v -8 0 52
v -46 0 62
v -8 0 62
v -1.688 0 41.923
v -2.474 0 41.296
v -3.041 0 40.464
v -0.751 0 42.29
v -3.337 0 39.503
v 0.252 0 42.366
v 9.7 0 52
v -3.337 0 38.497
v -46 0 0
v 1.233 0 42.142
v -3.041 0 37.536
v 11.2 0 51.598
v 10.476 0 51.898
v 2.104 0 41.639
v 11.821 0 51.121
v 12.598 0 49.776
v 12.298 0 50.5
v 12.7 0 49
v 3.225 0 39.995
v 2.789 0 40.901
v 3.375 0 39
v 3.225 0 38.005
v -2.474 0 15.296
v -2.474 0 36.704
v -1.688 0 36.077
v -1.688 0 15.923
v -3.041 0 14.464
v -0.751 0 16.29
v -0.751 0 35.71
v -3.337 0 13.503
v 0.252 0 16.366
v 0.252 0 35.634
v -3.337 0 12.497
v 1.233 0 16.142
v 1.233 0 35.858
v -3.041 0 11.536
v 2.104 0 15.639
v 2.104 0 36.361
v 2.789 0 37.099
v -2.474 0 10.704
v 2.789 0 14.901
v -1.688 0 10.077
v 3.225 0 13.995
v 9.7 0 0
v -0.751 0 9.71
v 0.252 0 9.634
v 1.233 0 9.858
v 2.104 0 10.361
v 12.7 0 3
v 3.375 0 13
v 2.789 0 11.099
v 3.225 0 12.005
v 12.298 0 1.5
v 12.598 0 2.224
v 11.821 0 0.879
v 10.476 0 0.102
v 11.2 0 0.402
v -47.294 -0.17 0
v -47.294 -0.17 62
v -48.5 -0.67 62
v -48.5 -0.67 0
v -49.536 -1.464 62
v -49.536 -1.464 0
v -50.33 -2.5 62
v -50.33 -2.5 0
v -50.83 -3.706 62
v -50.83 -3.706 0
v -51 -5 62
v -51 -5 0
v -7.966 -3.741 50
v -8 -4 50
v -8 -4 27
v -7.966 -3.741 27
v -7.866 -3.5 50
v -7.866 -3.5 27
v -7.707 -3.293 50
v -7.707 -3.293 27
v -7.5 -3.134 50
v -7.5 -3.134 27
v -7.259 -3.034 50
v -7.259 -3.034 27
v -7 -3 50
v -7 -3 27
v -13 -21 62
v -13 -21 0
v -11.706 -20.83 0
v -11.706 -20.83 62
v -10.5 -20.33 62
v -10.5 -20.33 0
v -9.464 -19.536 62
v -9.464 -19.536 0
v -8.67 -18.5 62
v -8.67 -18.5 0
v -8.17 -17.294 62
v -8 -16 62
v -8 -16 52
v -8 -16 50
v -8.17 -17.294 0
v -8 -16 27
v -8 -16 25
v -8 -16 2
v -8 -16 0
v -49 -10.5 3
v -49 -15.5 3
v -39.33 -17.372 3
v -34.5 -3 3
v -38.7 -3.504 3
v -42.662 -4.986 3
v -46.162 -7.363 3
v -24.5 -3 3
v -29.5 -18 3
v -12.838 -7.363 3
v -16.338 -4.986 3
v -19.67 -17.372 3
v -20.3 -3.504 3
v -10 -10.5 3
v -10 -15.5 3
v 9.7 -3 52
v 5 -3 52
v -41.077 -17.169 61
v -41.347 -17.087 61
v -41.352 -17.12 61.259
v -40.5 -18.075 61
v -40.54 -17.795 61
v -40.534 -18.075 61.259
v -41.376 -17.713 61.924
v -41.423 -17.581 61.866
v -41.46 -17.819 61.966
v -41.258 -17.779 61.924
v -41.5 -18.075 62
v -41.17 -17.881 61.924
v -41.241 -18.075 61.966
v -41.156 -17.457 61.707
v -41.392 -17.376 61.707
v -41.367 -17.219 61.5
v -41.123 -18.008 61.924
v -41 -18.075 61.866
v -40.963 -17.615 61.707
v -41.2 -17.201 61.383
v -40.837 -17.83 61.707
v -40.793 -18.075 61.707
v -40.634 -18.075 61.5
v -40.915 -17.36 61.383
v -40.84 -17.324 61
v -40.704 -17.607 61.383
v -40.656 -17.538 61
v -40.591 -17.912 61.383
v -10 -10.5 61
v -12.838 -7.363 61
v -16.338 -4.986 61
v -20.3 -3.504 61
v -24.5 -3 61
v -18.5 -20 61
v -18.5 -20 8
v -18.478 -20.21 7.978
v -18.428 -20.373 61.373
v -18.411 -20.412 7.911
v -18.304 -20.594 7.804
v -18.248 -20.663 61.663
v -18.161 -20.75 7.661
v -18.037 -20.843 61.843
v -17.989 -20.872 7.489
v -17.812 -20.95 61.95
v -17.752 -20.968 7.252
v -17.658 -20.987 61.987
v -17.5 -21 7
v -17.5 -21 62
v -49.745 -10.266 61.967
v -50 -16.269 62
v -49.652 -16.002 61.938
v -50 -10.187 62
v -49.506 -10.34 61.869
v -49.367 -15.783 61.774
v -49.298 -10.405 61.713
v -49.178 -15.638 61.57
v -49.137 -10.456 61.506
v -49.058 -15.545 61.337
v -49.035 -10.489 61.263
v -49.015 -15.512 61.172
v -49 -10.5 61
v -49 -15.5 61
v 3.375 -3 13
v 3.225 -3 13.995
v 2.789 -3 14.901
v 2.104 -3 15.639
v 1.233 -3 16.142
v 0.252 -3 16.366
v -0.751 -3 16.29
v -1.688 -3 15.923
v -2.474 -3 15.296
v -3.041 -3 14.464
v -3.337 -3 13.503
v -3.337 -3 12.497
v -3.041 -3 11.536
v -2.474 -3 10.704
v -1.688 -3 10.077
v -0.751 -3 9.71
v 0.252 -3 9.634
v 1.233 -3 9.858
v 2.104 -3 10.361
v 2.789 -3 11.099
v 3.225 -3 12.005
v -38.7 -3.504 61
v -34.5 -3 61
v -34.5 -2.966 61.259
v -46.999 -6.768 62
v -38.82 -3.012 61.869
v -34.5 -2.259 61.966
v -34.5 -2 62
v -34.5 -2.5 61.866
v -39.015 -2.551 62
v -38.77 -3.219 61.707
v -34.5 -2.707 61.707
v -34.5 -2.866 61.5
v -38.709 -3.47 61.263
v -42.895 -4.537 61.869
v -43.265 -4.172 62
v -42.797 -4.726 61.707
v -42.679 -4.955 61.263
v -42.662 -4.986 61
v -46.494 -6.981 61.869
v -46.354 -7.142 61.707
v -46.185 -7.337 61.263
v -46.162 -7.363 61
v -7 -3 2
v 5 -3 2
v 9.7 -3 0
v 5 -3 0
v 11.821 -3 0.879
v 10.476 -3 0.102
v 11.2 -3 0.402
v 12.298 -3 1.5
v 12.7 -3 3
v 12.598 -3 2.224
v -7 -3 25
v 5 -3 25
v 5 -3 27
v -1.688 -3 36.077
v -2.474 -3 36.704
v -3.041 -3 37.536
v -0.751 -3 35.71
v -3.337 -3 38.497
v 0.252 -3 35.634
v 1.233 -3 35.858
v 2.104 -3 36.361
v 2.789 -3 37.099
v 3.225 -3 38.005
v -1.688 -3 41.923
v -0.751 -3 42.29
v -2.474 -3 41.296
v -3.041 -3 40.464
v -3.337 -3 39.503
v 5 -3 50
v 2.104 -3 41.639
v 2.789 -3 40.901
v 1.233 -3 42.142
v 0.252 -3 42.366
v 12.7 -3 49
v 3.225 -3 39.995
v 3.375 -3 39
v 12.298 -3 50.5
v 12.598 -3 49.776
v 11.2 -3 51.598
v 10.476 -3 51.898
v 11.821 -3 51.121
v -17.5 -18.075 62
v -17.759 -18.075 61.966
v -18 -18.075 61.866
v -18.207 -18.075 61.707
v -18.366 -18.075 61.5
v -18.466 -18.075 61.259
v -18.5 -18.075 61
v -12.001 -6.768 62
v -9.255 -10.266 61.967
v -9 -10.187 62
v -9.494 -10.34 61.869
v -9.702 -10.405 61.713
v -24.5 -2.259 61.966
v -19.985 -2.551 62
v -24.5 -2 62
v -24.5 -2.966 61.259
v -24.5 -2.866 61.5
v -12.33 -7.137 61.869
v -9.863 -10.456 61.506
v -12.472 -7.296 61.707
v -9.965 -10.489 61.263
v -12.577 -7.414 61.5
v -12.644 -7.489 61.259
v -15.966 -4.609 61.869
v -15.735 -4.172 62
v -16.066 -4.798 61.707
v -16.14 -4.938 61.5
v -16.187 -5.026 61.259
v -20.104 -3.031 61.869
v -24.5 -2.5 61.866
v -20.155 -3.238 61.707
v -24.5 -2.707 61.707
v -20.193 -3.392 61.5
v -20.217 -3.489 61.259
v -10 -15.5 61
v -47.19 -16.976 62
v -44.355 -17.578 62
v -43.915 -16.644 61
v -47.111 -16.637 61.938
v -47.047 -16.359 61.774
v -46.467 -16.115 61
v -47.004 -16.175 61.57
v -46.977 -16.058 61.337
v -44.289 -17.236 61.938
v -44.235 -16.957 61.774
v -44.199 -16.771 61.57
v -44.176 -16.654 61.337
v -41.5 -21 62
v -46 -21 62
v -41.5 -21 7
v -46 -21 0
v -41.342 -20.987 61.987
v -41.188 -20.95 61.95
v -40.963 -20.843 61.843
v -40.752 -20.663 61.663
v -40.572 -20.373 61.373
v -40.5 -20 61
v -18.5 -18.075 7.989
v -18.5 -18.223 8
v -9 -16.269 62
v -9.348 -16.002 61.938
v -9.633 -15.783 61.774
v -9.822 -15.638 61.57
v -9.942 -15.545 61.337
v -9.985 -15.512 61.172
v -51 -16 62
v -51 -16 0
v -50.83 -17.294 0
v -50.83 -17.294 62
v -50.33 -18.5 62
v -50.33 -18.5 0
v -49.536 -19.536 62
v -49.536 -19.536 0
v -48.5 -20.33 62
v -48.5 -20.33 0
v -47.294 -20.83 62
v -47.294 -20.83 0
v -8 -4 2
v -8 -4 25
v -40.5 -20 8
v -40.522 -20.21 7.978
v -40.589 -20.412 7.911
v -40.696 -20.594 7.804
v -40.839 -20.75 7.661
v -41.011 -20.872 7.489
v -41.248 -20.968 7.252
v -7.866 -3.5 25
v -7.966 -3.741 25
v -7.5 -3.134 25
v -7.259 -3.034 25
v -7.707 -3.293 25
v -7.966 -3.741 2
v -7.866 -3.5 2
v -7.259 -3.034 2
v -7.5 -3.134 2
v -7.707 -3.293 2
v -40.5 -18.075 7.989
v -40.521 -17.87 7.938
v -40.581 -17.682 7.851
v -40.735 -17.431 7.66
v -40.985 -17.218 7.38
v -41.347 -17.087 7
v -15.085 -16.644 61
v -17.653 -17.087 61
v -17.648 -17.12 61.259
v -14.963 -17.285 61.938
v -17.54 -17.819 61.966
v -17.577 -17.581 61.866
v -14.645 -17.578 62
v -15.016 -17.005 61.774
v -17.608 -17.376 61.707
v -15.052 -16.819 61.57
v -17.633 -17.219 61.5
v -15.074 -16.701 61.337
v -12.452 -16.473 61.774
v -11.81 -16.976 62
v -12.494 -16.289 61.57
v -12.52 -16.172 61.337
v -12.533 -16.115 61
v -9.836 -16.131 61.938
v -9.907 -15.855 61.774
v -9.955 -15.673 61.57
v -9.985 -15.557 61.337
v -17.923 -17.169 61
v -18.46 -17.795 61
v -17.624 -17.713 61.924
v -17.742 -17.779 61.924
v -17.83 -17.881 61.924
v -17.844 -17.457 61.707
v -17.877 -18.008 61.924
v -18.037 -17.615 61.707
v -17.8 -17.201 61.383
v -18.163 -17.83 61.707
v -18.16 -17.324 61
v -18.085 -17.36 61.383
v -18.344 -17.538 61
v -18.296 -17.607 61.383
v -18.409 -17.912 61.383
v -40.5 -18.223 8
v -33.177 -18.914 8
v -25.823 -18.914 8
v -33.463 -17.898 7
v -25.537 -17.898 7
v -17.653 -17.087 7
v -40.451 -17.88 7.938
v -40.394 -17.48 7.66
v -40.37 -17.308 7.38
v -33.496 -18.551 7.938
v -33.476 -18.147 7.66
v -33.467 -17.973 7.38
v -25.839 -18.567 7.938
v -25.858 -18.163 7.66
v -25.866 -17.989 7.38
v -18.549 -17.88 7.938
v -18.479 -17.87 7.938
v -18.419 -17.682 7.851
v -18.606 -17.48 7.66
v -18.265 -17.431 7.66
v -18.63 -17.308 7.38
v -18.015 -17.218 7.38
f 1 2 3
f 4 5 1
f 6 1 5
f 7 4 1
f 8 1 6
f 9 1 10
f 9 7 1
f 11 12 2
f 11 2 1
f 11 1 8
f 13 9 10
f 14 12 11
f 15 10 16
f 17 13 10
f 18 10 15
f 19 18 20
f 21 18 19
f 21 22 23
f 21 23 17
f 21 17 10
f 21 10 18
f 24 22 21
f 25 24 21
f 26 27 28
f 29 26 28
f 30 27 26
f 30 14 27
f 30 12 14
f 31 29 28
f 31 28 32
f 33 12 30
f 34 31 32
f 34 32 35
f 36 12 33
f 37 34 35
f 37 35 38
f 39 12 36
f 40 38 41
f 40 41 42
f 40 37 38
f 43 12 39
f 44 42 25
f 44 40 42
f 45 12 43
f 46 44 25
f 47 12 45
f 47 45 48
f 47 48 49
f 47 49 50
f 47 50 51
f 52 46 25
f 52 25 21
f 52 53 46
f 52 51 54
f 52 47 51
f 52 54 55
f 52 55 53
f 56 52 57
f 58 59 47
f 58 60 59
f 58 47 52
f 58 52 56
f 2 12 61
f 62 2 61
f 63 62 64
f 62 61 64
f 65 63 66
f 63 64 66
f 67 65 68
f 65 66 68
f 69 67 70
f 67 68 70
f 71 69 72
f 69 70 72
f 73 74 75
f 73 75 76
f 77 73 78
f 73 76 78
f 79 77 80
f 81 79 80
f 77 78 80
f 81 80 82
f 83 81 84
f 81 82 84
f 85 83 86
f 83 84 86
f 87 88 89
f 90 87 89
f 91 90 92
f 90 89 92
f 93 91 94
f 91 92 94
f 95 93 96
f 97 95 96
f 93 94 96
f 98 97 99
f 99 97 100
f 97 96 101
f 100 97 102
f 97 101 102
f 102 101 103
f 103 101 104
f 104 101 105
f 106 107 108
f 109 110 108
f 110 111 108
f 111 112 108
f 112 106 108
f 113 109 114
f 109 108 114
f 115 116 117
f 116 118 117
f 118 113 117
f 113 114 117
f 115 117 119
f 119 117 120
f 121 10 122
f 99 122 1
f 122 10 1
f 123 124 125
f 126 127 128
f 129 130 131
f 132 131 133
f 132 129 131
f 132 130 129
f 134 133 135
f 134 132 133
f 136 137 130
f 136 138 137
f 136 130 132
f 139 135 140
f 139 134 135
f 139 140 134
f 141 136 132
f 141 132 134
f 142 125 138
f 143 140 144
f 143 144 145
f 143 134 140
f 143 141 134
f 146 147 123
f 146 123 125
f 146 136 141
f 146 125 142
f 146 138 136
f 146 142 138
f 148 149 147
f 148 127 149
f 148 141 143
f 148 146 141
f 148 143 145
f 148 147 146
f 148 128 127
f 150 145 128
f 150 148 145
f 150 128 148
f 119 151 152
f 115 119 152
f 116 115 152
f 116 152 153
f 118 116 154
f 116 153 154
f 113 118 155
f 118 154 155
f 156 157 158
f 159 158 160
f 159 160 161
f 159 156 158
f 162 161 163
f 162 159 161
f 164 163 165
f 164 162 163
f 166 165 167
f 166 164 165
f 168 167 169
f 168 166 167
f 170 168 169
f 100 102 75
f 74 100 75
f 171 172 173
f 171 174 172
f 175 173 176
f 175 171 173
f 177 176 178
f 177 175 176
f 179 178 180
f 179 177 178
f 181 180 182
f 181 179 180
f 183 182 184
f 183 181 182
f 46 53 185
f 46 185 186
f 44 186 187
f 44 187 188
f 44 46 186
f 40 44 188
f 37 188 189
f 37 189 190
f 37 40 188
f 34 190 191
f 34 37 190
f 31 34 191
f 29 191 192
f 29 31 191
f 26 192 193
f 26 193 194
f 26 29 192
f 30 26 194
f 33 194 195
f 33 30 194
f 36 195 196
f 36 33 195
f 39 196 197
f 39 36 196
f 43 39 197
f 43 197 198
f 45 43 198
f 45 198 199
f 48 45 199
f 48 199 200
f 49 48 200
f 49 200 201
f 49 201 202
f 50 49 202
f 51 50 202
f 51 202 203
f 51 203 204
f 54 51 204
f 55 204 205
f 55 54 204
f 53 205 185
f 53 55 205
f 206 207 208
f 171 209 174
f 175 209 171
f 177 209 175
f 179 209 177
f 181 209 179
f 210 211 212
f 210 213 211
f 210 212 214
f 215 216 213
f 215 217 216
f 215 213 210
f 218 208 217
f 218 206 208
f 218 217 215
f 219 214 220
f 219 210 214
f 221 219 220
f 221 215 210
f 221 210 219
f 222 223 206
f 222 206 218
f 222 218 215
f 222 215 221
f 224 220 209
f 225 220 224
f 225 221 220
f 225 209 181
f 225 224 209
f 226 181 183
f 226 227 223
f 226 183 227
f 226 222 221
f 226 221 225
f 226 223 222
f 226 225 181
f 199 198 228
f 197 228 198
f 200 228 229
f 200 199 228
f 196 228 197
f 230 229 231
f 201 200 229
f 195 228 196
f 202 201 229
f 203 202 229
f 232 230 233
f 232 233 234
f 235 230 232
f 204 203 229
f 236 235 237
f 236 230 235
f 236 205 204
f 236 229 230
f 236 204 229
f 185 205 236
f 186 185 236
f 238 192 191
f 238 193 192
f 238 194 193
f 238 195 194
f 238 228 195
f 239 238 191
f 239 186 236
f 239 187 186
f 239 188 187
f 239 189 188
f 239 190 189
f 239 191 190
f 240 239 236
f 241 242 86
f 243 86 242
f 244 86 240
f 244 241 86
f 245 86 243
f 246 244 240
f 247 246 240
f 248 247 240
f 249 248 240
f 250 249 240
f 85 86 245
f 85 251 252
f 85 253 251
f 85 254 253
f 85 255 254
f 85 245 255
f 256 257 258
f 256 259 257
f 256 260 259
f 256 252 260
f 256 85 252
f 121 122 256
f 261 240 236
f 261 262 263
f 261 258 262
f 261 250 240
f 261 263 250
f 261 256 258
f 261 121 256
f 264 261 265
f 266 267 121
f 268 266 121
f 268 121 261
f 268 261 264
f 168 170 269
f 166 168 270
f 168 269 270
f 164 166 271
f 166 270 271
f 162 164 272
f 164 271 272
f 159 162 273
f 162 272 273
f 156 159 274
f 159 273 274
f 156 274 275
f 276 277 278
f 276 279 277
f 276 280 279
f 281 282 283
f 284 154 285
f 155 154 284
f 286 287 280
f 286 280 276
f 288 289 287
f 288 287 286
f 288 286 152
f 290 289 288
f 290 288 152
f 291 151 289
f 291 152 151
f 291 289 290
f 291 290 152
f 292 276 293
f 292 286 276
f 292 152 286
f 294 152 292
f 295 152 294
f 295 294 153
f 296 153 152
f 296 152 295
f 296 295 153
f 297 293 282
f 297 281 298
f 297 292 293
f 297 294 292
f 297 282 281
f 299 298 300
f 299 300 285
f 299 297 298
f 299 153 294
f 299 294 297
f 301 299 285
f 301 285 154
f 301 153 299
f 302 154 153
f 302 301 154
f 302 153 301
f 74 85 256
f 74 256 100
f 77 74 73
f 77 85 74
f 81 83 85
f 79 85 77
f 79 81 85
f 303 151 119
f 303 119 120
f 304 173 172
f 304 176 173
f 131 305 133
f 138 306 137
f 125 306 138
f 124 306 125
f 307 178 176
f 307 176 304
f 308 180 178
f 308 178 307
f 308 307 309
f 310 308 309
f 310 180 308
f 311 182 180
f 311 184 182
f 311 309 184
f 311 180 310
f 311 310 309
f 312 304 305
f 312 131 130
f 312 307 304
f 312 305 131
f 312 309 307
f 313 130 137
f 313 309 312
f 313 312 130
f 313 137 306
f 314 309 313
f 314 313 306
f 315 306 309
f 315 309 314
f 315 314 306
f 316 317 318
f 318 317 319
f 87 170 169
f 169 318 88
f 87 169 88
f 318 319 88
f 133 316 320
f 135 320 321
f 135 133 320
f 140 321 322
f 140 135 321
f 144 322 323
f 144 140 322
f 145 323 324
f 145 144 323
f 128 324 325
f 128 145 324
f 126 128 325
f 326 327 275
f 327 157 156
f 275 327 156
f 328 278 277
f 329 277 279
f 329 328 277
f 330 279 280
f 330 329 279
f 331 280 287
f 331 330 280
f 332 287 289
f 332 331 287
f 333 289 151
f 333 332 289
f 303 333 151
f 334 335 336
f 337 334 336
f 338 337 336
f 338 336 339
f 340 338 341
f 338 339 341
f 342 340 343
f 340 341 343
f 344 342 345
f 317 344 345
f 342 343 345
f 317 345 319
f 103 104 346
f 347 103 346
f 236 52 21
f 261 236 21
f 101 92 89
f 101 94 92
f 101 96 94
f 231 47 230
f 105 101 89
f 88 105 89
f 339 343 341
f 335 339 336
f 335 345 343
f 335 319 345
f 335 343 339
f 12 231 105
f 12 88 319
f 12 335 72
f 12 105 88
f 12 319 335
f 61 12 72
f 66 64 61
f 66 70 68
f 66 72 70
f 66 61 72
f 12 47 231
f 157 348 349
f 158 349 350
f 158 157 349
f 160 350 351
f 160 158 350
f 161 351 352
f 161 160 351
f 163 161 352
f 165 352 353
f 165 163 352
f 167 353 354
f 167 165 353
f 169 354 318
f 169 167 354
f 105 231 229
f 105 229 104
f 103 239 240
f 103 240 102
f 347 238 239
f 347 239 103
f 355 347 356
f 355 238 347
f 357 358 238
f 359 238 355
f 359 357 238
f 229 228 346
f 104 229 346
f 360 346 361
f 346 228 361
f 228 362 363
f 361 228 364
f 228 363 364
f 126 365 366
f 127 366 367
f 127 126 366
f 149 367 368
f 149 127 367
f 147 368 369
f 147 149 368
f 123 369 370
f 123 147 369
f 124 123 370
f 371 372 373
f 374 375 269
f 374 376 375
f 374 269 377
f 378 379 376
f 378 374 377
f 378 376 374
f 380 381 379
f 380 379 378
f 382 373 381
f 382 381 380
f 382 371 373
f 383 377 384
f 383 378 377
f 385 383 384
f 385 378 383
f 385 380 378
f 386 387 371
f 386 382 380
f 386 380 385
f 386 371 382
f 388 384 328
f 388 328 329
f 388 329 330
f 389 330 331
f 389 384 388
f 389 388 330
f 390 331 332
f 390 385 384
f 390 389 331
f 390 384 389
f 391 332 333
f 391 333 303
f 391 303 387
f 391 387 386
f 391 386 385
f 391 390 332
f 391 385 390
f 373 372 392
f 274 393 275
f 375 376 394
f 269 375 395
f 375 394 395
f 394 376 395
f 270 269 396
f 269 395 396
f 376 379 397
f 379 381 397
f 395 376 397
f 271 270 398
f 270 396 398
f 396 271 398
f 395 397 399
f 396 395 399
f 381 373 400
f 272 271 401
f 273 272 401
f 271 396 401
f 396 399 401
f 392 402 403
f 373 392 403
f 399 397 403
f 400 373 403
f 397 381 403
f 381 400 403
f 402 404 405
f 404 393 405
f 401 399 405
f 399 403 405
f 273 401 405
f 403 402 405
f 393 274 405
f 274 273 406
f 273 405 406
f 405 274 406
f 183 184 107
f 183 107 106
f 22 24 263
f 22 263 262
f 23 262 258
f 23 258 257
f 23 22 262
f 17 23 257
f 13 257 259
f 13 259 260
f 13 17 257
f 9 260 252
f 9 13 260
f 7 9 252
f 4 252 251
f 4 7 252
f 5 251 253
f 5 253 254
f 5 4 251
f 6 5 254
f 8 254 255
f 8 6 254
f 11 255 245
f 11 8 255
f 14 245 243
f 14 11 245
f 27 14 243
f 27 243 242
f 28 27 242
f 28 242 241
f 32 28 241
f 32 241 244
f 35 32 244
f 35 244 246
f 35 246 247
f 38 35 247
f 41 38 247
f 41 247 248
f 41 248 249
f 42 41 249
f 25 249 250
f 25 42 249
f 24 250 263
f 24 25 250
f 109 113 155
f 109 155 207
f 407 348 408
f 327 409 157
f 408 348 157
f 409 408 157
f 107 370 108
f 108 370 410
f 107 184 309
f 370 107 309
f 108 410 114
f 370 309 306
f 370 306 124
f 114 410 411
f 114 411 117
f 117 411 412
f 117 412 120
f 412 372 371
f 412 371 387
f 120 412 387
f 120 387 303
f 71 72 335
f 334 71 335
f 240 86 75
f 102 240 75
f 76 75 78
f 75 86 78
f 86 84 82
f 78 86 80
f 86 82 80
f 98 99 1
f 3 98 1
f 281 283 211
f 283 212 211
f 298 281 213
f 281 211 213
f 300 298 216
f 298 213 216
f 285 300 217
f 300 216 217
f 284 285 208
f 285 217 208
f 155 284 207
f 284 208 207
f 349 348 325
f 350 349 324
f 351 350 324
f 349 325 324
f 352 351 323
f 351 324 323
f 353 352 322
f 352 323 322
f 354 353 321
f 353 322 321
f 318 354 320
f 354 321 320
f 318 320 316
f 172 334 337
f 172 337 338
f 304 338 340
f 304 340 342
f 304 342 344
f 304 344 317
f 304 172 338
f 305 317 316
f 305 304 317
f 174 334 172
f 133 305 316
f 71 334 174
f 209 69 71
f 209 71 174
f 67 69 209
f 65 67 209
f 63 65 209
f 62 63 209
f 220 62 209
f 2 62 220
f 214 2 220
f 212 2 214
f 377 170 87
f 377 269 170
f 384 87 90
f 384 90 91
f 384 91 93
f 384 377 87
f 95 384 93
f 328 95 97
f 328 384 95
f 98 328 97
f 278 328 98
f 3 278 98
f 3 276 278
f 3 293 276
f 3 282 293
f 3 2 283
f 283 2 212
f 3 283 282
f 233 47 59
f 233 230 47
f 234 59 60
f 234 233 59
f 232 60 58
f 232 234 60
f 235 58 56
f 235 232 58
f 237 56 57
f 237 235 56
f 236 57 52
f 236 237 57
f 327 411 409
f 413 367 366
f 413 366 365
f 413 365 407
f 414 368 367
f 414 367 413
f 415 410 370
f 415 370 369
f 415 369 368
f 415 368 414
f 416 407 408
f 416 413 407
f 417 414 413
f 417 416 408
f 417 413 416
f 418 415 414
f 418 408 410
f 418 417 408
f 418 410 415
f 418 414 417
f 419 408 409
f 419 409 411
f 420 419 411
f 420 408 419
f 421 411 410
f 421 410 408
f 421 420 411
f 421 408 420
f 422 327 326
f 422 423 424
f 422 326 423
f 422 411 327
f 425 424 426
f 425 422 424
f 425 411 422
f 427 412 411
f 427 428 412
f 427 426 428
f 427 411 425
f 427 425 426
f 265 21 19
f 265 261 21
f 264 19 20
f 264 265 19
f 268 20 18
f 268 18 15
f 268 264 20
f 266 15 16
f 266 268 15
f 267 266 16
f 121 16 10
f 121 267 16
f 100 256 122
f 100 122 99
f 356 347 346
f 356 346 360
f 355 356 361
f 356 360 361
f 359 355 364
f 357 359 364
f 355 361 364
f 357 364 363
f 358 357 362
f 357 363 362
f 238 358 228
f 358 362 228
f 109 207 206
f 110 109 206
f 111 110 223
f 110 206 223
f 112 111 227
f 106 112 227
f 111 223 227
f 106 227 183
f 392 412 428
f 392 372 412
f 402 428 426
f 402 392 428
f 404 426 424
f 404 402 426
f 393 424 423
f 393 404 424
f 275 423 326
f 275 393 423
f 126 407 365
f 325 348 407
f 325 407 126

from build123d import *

# Parameters (mm, degrees)
SKETCH_W            = 25.4
SKETCH_H            = 52
SKETCH_R            = 3.375
PAD_DEPTH           = 3
PAD001_DEPTH        = 62
POCKET_DEPTH        = 59
SKETCH004_W         = 22
SKETCH004_H         = 54
POCKET001_DEPTH     = 5
FILLET_R            = 3
PAD002_DEPTH        = 2
LINEARPATTERN_COUNT = 3
LINEARPATTERN_PITCH = 25
FILLET001_R         = 1


with BuildPart() as part:
    # Sketch → Pad (new body)
    with BuildSketch(Plane.XZ):
        with Locations((0, 26)):
            Rectangle(SKETCH_W, SKETCH_H)
        with Locations((0, 39)):
            Circle(SKETCH_R, mode=Mode.SUBTRACT)
        with Locations((0, 13)):
            Circle(SKETCH_R, mode=Mode.SUBTRACT)
    extrude(amount=PAD_DEPTH)

    # Sketch001 → Pad001 (join)
    with BuildSketch(Plane.XY):
        with BuildLine():
            Line((-51, -5), (-51, -16))
            ThreePointArc((-51, -16), (-49.535534, -19.535534), (-46, -21))
            Line((-46, -21), (-13, -21))
            ThreePointArc((-13, -21), (-9.464466, -19.535534), (-8, -16))
            Line((-8, -16), (-8, 0))
            Line((-46, 0), (-8, 0))
            ThreePointArc((-46, 0), (-49.535534, -1.464466), (-51, -5))
        make_face()
    extrude(amount=PAD001_DEPTH)

    # Sketch003 → Pocket (cut)
    with BuildSketch(Plane(origin=(0, 0, 62), x_dir=(-1, 0, 0), z_dir=(0, 0, 1))):
        with BuildLine():
            Line((49, 15.5), (49, 10.5))
            ThreePointArc((34.5, 3), (42.662414, 4.986), (49, 10.5))
            Line((24.5, 3), (34.5, 3))
            ThreePointArc((10, 10.5), (16.337586, 4.986), (24.5, 3))
            Line((10, 10.5), (10, 15.5))
            ThreePointArc((49, 15.5), (29.5, 18), (10, 15.5))
        make_face()
    extrude(amount=-POCKET_DEPTH, mode=Mode.SUBTRACT)

    # Sketch004 (on Face11 of Pocket) → Pocket001 (cut)
    with BuildSketch(Plane.XZ.offset(21)):
        with Locations((-29.5, 35)):
            Rectangle(SKETCH004_W, SKETCH004_H)
    extrude(amount=-POCKET001_DEPTH, mode=Mode.SUBTRACT)

    # Fillet
    fillet_edges = [part.edges().sort_by_distance(p)[0] for p in [
        (12.7, -1.5, 52),
        (12.7, -1.5, 0),
    ]]
    fillet(fillet_edges, radius=FILLET_R)

    # Sketch005 → Pad002 (join)
    with BuildSketch(Plane.XY):
        Polygon((-8, -16), (-8, -3), (5, -3), align=None)
    pad002 = extrude(amount=PAD002_DEPTH)

    # LinearPattern: Pad002 ×3
    with Locations(*[(0, 0, i * LINEARPATTERN_PITCH) for i in range(1, LINEARPATTERN_COUNT)]):
        add(pad002)

    # Fillet001
    fillet001_edges = [part.edges().sort_by_distance(p)[0] for p in [
        (-8, -3, 38.5),
        (-8, -3, 13.5),
        (-18.5, -21, 35),
        (-29.5, -21, 8),
        (-40.5, -21, 35),
        (-40.5, -19.106666, 62),
        (-18.5, -19.106666, 62),
        (-40.5, -17.213332, 35),
        (-29.5, -18, 8),
        (-18.5, -17.213332, 35),
        (-14.225957, -16.475944, 62),
        (-10, -13, 62),
        (-16.337586, -4.986, 62),
        (-29.5, -3, 62),
        (-42.662414, -4.986, 62),
        (-49, -13, 62),
        (-44.774043, -16.475944, 62),
    ]]
    fillet(fillet001_edges, radius=FILLET001_R)


solid = part.part
